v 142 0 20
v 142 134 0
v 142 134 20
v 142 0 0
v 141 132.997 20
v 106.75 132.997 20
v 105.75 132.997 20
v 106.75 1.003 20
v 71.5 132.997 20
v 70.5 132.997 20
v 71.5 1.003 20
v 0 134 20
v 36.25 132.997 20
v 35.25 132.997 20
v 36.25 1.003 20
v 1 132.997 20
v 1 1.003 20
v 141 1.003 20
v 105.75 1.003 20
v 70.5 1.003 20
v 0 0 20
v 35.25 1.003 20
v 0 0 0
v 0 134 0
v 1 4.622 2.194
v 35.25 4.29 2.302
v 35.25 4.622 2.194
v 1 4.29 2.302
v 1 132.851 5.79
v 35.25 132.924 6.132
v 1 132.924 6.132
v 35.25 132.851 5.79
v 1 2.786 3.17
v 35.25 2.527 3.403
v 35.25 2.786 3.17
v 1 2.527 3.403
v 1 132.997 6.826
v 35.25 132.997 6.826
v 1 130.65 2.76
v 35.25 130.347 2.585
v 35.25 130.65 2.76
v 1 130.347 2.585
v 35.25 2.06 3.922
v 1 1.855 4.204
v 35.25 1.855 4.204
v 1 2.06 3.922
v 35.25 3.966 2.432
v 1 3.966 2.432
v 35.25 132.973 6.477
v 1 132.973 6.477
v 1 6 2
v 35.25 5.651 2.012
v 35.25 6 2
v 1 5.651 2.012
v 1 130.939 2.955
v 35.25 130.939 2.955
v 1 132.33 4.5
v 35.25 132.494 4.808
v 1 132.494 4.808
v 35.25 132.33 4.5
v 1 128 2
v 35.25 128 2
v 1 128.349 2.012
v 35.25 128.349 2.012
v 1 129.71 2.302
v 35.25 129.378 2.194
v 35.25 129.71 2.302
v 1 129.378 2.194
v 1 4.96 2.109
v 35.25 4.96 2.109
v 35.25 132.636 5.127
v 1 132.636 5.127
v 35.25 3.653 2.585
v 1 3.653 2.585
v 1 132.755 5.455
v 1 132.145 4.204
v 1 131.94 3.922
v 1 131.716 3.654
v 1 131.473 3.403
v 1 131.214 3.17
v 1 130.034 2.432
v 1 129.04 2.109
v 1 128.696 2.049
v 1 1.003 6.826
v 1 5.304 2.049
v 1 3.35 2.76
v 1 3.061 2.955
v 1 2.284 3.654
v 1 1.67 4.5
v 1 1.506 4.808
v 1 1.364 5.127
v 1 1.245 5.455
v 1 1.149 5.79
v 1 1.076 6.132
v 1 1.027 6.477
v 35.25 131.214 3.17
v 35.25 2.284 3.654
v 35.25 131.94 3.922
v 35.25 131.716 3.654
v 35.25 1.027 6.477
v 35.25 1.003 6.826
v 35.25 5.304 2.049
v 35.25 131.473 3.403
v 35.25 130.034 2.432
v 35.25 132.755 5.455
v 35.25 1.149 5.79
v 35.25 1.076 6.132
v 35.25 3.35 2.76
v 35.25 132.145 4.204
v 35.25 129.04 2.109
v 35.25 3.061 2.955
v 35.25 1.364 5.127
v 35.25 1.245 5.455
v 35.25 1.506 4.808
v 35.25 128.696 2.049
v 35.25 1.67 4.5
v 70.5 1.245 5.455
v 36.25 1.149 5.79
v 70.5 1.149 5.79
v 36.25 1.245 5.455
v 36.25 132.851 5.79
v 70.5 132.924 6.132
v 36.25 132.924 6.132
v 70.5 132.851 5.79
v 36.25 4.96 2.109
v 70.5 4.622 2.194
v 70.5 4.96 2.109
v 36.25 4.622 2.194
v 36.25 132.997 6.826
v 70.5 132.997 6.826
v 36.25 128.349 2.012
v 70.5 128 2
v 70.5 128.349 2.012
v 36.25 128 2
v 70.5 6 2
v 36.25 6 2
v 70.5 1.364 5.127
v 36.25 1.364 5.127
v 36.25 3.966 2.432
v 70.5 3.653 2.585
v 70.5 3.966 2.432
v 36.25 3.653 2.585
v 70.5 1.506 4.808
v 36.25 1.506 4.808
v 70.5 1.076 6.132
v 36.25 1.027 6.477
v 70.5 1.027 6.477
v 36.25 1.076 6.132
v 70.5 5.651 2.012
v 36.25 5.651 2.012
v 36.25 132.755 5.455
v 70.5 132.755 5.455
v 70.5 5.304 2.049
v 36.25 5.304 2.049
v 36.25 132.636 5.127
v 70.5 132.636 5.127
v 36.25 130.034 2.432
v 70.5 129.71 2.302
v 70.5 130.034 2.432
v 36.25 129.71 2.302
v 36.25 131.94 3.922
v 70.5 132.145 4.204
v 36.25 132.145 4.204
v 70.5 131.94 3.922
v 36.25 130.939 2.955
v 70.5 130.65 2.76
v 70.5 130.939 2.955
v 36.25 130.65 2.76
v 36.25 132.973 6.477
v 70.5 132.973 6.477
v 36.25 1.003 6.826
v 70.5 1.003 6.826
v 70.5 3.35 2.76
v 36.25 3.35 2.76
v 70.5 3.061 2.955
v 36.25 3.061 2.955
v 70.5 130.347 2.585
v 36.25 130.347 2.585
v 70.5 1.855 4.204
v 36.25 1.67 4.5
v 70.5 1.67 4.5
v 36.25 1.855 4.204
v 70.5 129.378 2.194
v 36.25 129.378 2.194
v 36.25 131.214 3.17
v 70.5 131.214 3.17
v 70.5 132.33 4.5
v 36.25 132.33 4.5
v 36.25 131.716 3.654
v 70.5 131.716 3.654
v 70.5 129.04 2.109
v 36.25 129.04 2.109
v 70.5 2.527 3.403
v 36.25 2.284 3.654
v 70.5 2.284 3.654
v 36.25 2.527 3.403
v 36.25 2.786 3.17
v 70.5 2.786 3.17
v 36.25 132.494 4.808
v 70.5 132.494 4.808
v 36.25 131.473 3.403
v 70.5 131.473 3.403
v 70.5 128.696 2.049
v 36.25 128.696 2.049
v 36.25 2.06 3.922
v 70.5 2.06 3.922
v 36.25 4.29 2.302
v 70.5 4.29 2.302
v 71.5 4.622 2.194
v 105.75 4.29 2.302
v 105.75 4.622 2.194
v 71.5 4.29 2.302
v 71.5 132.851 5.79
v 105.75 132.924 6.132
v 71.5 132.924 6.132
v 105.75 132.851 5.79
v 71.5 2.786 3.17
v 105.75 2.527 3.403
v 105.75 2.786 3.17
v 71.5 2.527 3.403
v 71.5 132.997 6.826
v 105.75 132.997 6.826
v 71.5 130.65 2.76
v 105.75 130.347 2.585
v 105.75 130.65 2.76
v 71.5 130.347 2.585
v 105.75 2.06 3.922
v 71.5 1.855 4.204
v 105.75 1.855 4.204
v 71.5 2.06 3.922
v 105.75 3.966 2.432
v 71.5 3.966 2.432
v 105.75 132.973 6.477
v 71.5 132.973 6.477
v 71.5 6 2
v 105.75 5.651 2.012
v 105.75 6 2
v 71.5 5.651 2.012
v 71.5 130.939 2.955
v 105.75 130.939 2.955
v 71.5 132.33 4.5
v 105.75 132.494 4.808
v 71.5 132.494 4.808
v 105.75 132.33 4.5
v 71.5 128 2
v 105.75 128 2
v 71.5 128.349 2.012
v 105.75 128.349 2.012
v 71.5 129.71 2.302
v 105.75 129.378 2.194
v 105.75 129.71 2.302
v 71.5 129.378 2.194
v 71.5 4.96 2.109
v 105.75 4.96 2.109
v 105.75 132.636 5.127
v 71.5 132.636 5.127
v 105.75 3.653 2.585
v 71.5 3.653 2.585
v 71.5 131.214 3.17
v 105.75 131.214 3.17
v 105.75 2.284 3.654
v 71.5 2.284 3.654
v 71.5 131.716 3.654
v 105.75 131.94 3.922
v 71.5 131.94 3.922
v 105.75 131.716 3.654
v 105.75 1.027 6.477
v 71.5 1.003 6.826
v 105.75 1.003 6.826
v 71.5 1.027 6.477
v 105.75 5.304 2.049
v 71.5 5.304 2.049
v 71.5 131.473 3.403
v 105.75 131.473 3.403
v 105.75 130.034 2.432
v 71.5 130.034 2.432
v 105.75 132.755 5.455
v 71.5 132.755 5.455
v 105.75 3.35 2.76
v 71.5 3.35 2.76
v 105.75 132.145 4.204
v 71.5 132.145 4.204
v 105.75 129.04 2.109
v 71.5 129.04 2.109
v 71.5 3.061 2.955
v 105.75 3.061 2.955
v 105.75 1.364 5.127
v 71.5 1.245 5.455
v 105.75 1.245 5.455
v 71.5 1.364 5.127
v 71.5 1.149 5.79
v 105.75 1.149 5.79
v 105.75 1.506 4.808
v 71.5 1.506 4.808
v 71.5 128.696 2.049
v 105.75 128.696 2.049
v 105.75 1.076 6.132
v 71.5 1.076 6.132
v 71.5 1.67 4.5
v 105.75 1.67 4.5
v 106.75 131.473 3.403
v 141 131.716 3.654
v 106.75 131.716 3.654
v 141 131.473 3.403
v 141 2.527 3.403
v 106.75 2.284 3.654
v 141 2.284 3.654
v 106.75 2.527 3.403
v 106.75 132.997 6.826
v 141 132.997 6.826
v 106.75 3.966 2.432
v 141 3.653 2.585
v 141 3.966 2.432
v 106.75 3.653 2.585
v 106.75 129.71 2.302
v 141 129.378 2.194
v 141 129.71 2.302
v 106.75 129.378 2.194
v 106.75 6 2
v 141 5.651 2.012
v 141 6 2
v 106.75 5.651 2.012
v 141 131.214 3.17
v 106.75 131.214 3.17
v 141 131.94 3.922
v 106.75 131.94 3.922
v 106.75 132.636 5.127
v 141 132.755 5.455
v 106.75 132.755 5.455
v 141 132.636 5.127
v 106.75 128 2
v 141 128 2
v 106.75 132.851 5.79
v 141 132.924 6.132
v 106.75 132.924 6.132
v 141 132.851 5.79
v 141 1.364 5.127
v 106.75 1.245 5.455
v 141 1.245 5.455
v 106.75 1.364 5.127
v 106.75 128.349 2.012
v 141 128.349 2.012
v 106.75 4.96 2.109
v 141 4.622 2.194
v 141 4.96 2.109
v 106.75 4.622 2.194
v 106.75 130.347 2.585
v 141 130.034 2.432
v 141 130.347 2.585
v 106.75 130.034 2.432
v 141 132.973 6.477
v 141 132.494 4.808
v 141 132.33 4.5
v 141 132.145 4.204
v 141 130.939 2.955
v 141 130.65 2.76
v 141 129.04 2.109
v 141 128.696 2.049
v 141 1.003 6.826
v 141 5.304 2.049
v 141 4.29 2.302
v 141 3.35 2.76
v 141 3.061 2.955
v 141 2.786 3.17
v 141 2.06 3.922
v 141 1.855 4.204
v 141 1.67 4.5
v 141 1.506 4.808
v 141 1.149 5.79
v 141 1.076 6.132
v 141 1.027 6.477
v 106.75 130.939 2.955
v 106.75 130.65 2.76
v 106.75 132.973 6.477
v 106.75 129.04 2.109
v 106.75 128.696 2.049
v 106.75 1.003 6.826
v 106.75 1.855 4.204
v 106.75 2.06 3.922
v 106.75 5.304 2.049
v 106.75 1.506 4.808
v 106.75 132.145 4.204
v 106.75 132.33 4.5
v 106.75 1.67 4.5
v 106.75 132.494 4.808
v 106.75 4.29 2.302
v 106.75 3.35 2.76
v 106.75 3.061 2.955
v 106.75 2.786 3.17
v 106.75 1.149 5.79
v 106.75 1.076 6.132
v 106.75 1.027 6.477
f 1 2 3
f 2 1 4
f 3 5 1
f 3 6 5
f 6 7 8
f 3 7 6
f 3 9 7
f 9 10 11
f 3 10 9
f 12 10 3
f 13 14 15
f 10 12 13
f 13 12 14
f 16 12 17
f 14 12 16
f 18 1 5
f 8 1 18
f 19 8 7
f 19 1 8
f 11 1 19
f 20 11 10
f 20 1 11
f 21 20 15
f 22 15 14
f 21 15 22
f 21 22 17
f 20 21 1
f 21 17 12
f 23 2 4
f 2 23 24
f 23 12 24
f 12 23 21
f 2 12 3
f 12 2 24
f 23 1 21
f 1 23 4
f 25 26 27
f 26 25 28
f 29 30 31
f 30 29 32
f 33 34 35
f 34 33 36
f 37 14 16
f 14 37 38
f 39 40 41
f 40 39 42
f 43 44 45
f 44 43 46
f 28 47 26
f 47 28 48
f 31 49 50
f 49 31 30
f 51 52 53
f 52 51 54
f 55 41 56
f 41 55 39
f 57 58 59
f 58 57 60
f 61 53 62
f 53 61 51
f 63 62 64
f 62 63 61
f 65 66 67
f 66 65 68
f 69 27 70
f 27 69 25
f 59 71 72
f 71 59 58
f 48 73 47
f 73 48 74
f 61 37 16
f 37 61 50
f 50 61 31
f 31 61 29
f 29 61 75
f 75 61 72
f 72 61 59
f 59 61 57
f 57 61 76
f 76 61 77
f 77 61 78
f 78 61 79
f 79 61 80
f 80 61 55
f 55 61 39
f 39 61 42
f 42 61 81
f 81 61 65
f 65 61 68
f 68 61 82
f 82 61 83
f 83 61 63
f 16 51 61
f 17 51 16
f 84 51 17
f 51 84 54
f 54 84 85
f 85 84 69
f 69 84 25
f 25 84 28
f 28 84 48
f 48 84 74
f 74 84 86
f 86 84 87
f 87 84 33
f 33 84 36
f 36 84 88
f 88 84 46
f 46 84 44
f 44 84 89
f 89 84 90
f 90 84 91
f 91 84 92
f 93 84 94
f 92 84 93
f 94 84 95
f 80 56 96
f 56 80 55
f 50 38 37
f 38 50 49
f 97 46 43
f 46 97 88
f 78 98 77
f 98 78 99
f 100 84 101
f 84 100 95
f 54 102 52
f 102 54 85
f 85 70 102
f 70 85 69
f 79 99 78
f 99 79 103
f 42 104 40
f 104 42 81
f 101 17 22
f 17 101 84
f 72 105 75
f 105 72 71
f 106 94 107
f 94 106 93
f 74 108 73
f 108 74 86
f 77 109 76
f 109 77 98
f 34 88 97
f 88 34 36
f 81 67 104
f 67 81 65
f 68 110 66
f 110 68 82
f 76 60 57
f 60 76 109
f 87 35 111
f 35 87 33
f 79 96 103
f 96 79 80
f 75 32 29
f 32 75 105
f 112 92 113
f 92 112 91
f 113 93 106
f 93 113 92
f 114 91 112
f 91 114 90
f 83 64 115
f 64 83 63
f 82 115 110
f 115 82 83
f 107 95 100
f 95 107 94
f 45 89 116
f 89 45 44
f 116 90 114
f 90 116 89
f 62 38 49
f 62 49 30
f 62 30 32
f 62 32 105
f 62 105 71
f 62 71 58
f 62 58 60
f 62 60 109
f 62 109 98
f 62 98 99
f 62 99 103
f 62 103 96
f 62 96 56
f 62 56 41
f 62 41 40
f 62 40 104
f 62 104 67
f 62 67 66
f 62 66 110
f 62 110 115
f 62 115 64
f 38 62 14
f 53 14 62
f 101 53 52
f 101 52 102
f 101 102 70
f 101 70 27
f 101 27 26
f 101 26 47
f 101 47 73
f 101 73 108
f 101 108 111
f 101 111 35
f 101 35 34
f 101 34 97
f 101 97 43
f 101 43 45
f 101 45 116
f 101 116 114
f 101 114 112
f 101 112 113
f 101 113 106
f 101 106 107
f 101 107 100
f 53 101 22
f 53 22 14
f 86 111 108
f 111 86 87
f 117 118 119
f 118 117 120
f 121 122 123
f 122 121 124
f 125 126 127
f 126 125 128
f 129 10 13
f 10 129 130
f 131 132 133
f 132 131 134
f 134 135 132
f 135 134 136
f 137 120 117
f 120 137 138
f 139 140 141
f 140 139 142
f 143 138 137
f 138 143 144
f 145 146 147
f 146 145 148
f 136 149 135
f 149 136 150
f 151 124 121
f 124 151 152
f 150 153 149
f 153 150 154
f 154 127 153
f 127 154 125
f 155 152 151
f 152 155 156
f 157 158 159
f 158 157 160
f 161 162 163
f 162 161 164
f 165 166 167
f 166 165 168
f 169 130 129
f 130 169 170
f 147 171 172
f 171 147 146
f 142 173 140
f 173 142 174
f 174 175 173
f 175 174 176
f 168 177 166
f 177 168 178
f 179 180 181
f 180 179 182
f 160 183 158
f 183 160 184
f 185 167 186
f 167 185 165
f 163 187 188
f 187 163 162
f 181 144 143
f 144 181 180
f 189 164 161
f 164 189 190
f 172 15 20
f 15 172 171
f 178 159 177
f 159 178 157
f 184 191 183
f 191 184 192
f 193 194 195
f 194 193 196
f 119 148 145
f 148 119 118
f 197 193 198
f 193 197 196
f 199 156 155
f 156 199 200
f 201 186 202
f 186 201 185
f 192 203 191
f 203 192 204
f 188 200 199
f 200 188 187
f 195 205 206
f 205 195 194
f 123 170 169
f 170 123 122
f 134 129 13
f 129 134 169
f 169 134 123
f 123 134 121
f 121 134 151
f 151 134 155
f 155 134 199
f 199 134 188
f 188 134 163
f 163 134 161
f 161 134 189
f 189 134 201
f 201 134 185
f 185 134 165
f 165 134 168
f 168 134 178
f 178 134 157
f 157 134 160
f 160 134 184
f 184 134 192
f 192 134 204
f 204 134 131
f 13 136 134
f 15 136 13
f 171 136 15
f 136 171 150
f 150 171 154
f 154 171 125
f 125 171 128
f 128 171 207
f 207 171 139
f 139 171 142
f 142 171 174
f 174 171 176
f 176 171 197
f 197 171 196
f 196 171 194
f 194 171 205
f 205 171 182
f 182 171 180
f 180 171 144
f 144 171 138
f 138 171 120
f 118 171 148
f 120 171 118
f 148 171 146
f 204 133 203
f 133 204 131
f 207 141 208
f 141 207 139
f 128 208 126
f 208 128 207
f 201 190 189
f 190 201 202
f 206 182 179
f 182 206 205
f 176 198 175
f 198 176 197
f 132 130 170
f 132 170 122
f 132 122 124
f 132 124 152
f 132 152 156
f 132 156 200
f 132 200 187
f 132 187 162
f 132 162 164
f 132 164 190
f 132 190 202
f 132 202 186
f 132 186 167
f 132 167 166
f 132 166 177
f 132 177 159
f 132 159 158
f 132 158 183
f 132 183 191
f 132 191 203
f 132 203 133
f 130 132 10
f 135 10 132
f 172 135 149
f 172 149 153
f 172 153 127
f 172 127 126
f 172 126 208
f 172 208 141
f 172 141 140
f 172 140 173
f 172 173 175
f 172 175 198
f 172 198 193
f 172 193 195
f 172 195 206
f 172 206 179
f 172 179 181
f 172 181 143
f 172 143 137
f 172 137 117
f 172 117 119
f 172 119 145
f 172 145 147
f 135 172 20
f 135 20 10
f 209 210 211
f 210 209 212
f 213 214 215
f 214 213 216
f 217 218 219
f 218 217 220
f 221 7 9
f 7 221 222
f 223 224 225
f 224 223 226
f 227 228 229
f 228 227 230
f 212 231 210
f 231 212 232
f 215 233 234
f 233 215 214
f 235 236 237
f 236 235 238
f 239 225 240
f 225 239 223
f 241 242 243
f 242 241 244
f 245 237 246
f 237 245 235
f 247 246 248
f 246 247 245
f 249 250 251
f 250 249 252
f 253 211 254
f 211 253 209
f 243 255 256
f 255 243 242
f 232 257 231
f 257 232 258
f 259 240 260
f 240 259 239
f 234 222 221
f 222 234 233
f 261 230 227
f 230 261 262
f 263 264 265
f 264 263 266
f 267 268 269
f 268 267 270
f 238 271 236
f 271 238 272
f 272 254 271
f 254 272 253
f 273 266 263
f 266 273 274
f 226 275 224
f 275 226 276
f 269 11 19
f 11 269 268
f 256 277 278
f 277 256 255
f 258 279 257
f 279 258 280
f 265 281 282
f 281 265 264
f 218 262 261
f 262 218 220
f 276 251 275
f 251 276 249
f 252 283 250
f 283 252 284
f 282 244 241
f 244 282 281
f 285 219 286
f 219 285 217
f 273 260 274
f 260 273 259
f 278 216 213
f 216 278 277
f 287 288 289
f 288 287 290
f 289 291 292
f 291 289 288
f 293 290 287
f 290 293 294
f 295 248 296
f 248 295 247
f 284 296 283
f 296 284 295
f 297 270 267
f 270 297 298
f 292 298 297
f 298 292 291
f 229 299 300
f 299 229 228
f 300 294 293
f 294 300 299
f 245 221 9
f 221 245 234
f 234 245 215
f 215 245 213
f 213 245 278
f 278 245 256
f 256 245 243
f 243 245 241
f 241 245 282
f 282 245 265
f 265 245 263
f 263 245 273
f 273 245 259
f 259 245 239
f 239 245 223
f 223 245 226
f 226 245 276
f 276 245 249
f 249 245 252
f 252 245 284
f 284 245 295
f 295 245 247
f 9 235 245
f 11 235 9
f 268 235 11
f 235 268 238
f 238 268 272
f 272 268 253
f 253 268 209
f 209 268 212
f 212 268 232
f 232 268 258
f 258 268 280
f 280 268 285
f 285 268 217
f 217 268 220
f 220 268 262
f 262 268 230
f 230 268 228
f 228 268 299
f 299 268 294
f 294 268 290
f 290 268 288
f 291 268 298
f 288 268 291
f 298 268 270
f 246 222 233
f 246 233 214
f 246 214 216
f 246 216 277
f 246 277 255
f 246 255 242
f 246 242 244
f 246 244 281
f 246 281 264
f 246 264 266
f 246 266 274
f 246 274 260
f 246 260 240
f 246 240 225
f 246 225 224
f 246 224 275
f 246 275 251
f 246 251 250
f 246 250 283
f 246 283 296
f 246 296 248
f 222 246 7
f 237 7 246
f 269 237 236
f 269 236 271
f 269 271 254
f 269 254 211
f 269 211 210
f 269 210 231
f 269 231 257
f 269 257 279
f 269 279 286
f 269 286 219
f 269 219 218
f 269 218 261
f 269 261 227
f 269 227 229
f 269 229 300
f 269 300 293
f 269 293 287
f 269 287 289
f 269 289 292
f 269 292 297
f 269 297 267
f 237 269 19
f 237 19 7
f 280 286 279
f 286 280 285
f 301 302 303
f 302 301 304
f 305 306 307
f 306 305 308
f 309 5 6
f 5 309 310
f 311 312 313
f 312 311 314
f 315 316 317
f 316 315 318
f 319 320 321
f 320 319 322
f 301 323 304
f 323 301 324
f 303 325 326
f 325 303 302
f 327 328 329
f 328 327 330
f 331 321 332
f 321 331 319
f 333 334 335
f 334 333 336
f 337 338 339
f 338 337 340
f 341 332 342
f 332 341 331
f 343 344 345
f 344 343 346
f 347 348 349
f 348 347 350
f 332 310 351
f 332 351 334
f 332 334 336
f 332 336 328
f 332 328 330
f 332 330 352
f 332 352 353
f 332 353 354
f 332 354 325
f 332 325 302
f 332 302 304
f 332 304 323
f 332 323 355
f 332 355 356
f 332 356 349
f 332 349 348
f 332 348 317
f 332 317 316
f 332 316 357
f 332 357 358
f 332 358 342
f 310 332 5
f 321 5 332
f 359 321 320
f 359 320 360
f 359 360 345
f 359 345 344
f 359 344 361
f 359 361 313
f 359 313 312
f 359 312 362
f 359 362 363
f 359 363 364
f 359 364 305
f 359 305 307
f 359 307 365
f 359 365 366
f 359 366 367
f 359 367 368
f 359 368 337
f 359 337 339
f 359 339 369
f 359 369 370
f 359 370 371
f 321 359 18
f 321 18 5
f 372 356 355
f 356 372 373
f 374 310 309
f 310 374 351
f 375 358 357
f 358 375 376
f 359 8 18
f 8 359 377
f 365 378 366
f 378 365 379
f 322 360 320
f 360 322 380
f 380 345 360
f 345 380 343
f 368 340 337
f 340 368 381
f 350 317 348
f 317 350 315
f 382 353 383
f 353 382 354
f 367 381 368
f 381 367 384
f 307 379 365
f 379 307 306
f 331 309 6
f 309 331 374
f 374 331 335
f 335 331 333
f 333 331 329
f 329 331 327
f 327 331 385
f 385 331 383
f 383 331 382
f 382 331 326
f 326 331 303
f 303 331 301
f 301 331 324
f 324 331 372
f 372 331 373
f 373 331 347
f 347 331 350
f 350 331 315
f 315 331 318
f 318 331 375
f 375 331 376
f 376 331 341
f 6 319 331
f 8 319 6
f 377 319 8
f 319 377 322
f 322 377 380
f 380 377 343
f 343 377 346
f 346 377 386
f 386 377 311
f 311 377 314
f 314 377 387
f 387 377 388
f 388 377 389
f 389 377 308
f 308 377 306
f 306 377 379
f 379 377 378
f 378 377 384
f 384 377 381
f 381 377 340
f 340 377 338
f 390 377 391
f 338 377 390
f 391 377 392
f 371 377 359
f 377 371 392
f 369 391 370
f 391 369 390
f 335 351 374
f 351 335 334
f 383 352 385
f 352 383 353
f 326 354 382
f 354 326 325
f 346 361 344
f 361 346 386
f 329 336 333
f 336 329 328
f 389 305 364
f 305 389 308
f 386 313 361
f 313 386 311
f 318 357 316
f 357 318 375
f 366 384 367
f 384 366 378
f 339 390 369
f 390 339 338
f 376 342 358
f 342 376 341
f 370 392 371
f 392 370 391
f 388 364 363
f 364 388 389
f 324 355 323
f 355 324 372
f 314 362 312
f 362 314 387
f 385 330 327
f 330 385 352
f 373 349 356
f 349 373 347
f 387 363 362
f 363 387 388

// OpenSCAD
// file: ../lib/roundedcube.scad
//
// Dan Upshaw built this module and graciously granted his permission
// for inclusion in this repository.
// The code itself can be found at
// https://danielupshaw.com/openscad-rounded-corners/
// Higher definition curves
$fs = 0.01;

module roundedcube(size = [1, 1, 1], center = false, radius = 0.5, apply_to = "all") {
	// If single value, convert to [x, y, z] vector
	size = (size[0] == undef) ? [size, size, size] : size;

	translate_min = radius;
	translate_xmax = size[0] - radius;
	translate_ymax = size[1] - radius;
	translate_zmax = size[2] - radius;

	diameter = radius * 2;

	module build_point(type = "sphere", rotate = [0, 0, 0]) {
		if (type == "sphere") {
			sphere(r = radius);
		} else if (type == "cylinder") {
			rotate(a = rotate)
			cylinder(h = diameter, r = radius, center = true, $fn=90);
		}
	}

	obj_translate = (center == false) ?
		[0, 0, 0] : [
			-(size[0] / 2),
			-(size[1] / 2),
			-(size[2] / 2)
		];

	translate(v = obj_translate) {
		hull() {
			for (translate_x = [translate_min, translate_xmax]) {
				x_at = (translate_x == translate_min) ? "min" : "max";
				for (translate_y = [translate_min, translate_ymax]) {
					y_at = (translate_y == translate_min) ? "min" : "max";
					for (translate_z = [translate_min, translate_zmax]) {
						z_at = (translate_z == translate_min) ? "min" : "max";

						translate(v = [translate_x, translate_y, translate_z])
						if (
							(apply_to == "all") ||
							(apply_to == "xmin" && x_at == "min") || (apply_to == "xmax" && x_at == "max") ||
							(apply_to == "ymin" && y_at == "min") || (apply_to == "ymax" && y_at == "max") ||
							(apply_to == "zmin" && z_at == "min") || (apply_to == "zmax" && z_at == "max")
						) {
							build_point("sphere");
						} else {
							rotate = 
								(apply_to == "xmin" || apply_to == "xmax" || apply_to == "x") ? [0, 90, 0] : (
								(apply_to == "ymin" || apply_to == "ymax" || apply_to == "y") ? [90, 90, 0] :
								[0, 0, 0]
							);
							build_point("cylinder", rotate);
						}
					}
				}
			}
		}
	}
}
// file: parameters.scad
//parameters
//thickness of box sides
wall = 2;

//width of cards, including sleeves and extra space
crdX = 70;

//length of cards including sleeves and extra space
crdY = 93;                  

//height of the entire pile of cards.  modify if you have more cards
crdZ = 18;

//how much of the main box is tapered to accommodate the lid
lidY = 25;

//the size of the taper
lidDiff = 0.75;

//The amount of "looseness" between the lid and the box on each side
lidSpacing = 0.25;

sideFontName="Impact";
sideFontSize=10;
sideFontLeftPadding=2;

//constant to avoid coincident faces.  don't change this
_min=0.1;

//calculated values
trayX = crdX+(2*wall);
trayY = crdY+(2*wall);
trayZ = crdZ+(2*wall);

// values for card tray
crdTrayZ = 23 + wall;
trayNotch = 40;
trayFontSize = 16;

// non-card well
wellX = 142;

lvl1Z = 12;

// places discs
discR = 60;
discPadding = 2;
discHolder = 3;
discBrim = 2;
discNotch = 70;
holderY = (2 * discR) + (2 * discHolder) + (2 * discPadding) + (2 * discBrim);

//miscellaneous tray
boxSize = 243;
miscBottom = 1;
miscX = wellX;
miscY = boxSize - holderY;
miscZ = lvl1Z;
miscWall=1;

//blood tokens tray
// same basic size as the places disc holder
btWall = 1;
btBottom = 2;
btWellDepth = 18;
btZ = btBottom + btWellDepth;
btWellX = (wellX - (5*btWall))/4;

//blood tokens ks
// same basic size as the miscellaneous tray
btkWall = 1;
btkBottom = 2;
btkWellDepth = 18;
btkZ = btkBottom + btkWellDepth;
btkWellX = (wellX - (5*btWall))/4;
// main file
include <parameters.scad>;
use <../lib/roundedcube.scad>

difference(){

    cube([wellX,holderY,btZ]);

    translate([btWall,btWall,btBottom])
        btWell();   

    translate([(btWall*2) + btWellX,btWall,btBottom])
        btWell();   

    translate([(btWall*3) + (2*btWellX),btWall,btBottom])
        btWell();   

    translate([(btWall*4) + (3*btWellX),btWall,btBottom])
        btWell();   

}

module btWell() {
    color("red")
    roundedcube([btWellX,holderY-(2*btWall),40], false, 5 ,"x");
}
